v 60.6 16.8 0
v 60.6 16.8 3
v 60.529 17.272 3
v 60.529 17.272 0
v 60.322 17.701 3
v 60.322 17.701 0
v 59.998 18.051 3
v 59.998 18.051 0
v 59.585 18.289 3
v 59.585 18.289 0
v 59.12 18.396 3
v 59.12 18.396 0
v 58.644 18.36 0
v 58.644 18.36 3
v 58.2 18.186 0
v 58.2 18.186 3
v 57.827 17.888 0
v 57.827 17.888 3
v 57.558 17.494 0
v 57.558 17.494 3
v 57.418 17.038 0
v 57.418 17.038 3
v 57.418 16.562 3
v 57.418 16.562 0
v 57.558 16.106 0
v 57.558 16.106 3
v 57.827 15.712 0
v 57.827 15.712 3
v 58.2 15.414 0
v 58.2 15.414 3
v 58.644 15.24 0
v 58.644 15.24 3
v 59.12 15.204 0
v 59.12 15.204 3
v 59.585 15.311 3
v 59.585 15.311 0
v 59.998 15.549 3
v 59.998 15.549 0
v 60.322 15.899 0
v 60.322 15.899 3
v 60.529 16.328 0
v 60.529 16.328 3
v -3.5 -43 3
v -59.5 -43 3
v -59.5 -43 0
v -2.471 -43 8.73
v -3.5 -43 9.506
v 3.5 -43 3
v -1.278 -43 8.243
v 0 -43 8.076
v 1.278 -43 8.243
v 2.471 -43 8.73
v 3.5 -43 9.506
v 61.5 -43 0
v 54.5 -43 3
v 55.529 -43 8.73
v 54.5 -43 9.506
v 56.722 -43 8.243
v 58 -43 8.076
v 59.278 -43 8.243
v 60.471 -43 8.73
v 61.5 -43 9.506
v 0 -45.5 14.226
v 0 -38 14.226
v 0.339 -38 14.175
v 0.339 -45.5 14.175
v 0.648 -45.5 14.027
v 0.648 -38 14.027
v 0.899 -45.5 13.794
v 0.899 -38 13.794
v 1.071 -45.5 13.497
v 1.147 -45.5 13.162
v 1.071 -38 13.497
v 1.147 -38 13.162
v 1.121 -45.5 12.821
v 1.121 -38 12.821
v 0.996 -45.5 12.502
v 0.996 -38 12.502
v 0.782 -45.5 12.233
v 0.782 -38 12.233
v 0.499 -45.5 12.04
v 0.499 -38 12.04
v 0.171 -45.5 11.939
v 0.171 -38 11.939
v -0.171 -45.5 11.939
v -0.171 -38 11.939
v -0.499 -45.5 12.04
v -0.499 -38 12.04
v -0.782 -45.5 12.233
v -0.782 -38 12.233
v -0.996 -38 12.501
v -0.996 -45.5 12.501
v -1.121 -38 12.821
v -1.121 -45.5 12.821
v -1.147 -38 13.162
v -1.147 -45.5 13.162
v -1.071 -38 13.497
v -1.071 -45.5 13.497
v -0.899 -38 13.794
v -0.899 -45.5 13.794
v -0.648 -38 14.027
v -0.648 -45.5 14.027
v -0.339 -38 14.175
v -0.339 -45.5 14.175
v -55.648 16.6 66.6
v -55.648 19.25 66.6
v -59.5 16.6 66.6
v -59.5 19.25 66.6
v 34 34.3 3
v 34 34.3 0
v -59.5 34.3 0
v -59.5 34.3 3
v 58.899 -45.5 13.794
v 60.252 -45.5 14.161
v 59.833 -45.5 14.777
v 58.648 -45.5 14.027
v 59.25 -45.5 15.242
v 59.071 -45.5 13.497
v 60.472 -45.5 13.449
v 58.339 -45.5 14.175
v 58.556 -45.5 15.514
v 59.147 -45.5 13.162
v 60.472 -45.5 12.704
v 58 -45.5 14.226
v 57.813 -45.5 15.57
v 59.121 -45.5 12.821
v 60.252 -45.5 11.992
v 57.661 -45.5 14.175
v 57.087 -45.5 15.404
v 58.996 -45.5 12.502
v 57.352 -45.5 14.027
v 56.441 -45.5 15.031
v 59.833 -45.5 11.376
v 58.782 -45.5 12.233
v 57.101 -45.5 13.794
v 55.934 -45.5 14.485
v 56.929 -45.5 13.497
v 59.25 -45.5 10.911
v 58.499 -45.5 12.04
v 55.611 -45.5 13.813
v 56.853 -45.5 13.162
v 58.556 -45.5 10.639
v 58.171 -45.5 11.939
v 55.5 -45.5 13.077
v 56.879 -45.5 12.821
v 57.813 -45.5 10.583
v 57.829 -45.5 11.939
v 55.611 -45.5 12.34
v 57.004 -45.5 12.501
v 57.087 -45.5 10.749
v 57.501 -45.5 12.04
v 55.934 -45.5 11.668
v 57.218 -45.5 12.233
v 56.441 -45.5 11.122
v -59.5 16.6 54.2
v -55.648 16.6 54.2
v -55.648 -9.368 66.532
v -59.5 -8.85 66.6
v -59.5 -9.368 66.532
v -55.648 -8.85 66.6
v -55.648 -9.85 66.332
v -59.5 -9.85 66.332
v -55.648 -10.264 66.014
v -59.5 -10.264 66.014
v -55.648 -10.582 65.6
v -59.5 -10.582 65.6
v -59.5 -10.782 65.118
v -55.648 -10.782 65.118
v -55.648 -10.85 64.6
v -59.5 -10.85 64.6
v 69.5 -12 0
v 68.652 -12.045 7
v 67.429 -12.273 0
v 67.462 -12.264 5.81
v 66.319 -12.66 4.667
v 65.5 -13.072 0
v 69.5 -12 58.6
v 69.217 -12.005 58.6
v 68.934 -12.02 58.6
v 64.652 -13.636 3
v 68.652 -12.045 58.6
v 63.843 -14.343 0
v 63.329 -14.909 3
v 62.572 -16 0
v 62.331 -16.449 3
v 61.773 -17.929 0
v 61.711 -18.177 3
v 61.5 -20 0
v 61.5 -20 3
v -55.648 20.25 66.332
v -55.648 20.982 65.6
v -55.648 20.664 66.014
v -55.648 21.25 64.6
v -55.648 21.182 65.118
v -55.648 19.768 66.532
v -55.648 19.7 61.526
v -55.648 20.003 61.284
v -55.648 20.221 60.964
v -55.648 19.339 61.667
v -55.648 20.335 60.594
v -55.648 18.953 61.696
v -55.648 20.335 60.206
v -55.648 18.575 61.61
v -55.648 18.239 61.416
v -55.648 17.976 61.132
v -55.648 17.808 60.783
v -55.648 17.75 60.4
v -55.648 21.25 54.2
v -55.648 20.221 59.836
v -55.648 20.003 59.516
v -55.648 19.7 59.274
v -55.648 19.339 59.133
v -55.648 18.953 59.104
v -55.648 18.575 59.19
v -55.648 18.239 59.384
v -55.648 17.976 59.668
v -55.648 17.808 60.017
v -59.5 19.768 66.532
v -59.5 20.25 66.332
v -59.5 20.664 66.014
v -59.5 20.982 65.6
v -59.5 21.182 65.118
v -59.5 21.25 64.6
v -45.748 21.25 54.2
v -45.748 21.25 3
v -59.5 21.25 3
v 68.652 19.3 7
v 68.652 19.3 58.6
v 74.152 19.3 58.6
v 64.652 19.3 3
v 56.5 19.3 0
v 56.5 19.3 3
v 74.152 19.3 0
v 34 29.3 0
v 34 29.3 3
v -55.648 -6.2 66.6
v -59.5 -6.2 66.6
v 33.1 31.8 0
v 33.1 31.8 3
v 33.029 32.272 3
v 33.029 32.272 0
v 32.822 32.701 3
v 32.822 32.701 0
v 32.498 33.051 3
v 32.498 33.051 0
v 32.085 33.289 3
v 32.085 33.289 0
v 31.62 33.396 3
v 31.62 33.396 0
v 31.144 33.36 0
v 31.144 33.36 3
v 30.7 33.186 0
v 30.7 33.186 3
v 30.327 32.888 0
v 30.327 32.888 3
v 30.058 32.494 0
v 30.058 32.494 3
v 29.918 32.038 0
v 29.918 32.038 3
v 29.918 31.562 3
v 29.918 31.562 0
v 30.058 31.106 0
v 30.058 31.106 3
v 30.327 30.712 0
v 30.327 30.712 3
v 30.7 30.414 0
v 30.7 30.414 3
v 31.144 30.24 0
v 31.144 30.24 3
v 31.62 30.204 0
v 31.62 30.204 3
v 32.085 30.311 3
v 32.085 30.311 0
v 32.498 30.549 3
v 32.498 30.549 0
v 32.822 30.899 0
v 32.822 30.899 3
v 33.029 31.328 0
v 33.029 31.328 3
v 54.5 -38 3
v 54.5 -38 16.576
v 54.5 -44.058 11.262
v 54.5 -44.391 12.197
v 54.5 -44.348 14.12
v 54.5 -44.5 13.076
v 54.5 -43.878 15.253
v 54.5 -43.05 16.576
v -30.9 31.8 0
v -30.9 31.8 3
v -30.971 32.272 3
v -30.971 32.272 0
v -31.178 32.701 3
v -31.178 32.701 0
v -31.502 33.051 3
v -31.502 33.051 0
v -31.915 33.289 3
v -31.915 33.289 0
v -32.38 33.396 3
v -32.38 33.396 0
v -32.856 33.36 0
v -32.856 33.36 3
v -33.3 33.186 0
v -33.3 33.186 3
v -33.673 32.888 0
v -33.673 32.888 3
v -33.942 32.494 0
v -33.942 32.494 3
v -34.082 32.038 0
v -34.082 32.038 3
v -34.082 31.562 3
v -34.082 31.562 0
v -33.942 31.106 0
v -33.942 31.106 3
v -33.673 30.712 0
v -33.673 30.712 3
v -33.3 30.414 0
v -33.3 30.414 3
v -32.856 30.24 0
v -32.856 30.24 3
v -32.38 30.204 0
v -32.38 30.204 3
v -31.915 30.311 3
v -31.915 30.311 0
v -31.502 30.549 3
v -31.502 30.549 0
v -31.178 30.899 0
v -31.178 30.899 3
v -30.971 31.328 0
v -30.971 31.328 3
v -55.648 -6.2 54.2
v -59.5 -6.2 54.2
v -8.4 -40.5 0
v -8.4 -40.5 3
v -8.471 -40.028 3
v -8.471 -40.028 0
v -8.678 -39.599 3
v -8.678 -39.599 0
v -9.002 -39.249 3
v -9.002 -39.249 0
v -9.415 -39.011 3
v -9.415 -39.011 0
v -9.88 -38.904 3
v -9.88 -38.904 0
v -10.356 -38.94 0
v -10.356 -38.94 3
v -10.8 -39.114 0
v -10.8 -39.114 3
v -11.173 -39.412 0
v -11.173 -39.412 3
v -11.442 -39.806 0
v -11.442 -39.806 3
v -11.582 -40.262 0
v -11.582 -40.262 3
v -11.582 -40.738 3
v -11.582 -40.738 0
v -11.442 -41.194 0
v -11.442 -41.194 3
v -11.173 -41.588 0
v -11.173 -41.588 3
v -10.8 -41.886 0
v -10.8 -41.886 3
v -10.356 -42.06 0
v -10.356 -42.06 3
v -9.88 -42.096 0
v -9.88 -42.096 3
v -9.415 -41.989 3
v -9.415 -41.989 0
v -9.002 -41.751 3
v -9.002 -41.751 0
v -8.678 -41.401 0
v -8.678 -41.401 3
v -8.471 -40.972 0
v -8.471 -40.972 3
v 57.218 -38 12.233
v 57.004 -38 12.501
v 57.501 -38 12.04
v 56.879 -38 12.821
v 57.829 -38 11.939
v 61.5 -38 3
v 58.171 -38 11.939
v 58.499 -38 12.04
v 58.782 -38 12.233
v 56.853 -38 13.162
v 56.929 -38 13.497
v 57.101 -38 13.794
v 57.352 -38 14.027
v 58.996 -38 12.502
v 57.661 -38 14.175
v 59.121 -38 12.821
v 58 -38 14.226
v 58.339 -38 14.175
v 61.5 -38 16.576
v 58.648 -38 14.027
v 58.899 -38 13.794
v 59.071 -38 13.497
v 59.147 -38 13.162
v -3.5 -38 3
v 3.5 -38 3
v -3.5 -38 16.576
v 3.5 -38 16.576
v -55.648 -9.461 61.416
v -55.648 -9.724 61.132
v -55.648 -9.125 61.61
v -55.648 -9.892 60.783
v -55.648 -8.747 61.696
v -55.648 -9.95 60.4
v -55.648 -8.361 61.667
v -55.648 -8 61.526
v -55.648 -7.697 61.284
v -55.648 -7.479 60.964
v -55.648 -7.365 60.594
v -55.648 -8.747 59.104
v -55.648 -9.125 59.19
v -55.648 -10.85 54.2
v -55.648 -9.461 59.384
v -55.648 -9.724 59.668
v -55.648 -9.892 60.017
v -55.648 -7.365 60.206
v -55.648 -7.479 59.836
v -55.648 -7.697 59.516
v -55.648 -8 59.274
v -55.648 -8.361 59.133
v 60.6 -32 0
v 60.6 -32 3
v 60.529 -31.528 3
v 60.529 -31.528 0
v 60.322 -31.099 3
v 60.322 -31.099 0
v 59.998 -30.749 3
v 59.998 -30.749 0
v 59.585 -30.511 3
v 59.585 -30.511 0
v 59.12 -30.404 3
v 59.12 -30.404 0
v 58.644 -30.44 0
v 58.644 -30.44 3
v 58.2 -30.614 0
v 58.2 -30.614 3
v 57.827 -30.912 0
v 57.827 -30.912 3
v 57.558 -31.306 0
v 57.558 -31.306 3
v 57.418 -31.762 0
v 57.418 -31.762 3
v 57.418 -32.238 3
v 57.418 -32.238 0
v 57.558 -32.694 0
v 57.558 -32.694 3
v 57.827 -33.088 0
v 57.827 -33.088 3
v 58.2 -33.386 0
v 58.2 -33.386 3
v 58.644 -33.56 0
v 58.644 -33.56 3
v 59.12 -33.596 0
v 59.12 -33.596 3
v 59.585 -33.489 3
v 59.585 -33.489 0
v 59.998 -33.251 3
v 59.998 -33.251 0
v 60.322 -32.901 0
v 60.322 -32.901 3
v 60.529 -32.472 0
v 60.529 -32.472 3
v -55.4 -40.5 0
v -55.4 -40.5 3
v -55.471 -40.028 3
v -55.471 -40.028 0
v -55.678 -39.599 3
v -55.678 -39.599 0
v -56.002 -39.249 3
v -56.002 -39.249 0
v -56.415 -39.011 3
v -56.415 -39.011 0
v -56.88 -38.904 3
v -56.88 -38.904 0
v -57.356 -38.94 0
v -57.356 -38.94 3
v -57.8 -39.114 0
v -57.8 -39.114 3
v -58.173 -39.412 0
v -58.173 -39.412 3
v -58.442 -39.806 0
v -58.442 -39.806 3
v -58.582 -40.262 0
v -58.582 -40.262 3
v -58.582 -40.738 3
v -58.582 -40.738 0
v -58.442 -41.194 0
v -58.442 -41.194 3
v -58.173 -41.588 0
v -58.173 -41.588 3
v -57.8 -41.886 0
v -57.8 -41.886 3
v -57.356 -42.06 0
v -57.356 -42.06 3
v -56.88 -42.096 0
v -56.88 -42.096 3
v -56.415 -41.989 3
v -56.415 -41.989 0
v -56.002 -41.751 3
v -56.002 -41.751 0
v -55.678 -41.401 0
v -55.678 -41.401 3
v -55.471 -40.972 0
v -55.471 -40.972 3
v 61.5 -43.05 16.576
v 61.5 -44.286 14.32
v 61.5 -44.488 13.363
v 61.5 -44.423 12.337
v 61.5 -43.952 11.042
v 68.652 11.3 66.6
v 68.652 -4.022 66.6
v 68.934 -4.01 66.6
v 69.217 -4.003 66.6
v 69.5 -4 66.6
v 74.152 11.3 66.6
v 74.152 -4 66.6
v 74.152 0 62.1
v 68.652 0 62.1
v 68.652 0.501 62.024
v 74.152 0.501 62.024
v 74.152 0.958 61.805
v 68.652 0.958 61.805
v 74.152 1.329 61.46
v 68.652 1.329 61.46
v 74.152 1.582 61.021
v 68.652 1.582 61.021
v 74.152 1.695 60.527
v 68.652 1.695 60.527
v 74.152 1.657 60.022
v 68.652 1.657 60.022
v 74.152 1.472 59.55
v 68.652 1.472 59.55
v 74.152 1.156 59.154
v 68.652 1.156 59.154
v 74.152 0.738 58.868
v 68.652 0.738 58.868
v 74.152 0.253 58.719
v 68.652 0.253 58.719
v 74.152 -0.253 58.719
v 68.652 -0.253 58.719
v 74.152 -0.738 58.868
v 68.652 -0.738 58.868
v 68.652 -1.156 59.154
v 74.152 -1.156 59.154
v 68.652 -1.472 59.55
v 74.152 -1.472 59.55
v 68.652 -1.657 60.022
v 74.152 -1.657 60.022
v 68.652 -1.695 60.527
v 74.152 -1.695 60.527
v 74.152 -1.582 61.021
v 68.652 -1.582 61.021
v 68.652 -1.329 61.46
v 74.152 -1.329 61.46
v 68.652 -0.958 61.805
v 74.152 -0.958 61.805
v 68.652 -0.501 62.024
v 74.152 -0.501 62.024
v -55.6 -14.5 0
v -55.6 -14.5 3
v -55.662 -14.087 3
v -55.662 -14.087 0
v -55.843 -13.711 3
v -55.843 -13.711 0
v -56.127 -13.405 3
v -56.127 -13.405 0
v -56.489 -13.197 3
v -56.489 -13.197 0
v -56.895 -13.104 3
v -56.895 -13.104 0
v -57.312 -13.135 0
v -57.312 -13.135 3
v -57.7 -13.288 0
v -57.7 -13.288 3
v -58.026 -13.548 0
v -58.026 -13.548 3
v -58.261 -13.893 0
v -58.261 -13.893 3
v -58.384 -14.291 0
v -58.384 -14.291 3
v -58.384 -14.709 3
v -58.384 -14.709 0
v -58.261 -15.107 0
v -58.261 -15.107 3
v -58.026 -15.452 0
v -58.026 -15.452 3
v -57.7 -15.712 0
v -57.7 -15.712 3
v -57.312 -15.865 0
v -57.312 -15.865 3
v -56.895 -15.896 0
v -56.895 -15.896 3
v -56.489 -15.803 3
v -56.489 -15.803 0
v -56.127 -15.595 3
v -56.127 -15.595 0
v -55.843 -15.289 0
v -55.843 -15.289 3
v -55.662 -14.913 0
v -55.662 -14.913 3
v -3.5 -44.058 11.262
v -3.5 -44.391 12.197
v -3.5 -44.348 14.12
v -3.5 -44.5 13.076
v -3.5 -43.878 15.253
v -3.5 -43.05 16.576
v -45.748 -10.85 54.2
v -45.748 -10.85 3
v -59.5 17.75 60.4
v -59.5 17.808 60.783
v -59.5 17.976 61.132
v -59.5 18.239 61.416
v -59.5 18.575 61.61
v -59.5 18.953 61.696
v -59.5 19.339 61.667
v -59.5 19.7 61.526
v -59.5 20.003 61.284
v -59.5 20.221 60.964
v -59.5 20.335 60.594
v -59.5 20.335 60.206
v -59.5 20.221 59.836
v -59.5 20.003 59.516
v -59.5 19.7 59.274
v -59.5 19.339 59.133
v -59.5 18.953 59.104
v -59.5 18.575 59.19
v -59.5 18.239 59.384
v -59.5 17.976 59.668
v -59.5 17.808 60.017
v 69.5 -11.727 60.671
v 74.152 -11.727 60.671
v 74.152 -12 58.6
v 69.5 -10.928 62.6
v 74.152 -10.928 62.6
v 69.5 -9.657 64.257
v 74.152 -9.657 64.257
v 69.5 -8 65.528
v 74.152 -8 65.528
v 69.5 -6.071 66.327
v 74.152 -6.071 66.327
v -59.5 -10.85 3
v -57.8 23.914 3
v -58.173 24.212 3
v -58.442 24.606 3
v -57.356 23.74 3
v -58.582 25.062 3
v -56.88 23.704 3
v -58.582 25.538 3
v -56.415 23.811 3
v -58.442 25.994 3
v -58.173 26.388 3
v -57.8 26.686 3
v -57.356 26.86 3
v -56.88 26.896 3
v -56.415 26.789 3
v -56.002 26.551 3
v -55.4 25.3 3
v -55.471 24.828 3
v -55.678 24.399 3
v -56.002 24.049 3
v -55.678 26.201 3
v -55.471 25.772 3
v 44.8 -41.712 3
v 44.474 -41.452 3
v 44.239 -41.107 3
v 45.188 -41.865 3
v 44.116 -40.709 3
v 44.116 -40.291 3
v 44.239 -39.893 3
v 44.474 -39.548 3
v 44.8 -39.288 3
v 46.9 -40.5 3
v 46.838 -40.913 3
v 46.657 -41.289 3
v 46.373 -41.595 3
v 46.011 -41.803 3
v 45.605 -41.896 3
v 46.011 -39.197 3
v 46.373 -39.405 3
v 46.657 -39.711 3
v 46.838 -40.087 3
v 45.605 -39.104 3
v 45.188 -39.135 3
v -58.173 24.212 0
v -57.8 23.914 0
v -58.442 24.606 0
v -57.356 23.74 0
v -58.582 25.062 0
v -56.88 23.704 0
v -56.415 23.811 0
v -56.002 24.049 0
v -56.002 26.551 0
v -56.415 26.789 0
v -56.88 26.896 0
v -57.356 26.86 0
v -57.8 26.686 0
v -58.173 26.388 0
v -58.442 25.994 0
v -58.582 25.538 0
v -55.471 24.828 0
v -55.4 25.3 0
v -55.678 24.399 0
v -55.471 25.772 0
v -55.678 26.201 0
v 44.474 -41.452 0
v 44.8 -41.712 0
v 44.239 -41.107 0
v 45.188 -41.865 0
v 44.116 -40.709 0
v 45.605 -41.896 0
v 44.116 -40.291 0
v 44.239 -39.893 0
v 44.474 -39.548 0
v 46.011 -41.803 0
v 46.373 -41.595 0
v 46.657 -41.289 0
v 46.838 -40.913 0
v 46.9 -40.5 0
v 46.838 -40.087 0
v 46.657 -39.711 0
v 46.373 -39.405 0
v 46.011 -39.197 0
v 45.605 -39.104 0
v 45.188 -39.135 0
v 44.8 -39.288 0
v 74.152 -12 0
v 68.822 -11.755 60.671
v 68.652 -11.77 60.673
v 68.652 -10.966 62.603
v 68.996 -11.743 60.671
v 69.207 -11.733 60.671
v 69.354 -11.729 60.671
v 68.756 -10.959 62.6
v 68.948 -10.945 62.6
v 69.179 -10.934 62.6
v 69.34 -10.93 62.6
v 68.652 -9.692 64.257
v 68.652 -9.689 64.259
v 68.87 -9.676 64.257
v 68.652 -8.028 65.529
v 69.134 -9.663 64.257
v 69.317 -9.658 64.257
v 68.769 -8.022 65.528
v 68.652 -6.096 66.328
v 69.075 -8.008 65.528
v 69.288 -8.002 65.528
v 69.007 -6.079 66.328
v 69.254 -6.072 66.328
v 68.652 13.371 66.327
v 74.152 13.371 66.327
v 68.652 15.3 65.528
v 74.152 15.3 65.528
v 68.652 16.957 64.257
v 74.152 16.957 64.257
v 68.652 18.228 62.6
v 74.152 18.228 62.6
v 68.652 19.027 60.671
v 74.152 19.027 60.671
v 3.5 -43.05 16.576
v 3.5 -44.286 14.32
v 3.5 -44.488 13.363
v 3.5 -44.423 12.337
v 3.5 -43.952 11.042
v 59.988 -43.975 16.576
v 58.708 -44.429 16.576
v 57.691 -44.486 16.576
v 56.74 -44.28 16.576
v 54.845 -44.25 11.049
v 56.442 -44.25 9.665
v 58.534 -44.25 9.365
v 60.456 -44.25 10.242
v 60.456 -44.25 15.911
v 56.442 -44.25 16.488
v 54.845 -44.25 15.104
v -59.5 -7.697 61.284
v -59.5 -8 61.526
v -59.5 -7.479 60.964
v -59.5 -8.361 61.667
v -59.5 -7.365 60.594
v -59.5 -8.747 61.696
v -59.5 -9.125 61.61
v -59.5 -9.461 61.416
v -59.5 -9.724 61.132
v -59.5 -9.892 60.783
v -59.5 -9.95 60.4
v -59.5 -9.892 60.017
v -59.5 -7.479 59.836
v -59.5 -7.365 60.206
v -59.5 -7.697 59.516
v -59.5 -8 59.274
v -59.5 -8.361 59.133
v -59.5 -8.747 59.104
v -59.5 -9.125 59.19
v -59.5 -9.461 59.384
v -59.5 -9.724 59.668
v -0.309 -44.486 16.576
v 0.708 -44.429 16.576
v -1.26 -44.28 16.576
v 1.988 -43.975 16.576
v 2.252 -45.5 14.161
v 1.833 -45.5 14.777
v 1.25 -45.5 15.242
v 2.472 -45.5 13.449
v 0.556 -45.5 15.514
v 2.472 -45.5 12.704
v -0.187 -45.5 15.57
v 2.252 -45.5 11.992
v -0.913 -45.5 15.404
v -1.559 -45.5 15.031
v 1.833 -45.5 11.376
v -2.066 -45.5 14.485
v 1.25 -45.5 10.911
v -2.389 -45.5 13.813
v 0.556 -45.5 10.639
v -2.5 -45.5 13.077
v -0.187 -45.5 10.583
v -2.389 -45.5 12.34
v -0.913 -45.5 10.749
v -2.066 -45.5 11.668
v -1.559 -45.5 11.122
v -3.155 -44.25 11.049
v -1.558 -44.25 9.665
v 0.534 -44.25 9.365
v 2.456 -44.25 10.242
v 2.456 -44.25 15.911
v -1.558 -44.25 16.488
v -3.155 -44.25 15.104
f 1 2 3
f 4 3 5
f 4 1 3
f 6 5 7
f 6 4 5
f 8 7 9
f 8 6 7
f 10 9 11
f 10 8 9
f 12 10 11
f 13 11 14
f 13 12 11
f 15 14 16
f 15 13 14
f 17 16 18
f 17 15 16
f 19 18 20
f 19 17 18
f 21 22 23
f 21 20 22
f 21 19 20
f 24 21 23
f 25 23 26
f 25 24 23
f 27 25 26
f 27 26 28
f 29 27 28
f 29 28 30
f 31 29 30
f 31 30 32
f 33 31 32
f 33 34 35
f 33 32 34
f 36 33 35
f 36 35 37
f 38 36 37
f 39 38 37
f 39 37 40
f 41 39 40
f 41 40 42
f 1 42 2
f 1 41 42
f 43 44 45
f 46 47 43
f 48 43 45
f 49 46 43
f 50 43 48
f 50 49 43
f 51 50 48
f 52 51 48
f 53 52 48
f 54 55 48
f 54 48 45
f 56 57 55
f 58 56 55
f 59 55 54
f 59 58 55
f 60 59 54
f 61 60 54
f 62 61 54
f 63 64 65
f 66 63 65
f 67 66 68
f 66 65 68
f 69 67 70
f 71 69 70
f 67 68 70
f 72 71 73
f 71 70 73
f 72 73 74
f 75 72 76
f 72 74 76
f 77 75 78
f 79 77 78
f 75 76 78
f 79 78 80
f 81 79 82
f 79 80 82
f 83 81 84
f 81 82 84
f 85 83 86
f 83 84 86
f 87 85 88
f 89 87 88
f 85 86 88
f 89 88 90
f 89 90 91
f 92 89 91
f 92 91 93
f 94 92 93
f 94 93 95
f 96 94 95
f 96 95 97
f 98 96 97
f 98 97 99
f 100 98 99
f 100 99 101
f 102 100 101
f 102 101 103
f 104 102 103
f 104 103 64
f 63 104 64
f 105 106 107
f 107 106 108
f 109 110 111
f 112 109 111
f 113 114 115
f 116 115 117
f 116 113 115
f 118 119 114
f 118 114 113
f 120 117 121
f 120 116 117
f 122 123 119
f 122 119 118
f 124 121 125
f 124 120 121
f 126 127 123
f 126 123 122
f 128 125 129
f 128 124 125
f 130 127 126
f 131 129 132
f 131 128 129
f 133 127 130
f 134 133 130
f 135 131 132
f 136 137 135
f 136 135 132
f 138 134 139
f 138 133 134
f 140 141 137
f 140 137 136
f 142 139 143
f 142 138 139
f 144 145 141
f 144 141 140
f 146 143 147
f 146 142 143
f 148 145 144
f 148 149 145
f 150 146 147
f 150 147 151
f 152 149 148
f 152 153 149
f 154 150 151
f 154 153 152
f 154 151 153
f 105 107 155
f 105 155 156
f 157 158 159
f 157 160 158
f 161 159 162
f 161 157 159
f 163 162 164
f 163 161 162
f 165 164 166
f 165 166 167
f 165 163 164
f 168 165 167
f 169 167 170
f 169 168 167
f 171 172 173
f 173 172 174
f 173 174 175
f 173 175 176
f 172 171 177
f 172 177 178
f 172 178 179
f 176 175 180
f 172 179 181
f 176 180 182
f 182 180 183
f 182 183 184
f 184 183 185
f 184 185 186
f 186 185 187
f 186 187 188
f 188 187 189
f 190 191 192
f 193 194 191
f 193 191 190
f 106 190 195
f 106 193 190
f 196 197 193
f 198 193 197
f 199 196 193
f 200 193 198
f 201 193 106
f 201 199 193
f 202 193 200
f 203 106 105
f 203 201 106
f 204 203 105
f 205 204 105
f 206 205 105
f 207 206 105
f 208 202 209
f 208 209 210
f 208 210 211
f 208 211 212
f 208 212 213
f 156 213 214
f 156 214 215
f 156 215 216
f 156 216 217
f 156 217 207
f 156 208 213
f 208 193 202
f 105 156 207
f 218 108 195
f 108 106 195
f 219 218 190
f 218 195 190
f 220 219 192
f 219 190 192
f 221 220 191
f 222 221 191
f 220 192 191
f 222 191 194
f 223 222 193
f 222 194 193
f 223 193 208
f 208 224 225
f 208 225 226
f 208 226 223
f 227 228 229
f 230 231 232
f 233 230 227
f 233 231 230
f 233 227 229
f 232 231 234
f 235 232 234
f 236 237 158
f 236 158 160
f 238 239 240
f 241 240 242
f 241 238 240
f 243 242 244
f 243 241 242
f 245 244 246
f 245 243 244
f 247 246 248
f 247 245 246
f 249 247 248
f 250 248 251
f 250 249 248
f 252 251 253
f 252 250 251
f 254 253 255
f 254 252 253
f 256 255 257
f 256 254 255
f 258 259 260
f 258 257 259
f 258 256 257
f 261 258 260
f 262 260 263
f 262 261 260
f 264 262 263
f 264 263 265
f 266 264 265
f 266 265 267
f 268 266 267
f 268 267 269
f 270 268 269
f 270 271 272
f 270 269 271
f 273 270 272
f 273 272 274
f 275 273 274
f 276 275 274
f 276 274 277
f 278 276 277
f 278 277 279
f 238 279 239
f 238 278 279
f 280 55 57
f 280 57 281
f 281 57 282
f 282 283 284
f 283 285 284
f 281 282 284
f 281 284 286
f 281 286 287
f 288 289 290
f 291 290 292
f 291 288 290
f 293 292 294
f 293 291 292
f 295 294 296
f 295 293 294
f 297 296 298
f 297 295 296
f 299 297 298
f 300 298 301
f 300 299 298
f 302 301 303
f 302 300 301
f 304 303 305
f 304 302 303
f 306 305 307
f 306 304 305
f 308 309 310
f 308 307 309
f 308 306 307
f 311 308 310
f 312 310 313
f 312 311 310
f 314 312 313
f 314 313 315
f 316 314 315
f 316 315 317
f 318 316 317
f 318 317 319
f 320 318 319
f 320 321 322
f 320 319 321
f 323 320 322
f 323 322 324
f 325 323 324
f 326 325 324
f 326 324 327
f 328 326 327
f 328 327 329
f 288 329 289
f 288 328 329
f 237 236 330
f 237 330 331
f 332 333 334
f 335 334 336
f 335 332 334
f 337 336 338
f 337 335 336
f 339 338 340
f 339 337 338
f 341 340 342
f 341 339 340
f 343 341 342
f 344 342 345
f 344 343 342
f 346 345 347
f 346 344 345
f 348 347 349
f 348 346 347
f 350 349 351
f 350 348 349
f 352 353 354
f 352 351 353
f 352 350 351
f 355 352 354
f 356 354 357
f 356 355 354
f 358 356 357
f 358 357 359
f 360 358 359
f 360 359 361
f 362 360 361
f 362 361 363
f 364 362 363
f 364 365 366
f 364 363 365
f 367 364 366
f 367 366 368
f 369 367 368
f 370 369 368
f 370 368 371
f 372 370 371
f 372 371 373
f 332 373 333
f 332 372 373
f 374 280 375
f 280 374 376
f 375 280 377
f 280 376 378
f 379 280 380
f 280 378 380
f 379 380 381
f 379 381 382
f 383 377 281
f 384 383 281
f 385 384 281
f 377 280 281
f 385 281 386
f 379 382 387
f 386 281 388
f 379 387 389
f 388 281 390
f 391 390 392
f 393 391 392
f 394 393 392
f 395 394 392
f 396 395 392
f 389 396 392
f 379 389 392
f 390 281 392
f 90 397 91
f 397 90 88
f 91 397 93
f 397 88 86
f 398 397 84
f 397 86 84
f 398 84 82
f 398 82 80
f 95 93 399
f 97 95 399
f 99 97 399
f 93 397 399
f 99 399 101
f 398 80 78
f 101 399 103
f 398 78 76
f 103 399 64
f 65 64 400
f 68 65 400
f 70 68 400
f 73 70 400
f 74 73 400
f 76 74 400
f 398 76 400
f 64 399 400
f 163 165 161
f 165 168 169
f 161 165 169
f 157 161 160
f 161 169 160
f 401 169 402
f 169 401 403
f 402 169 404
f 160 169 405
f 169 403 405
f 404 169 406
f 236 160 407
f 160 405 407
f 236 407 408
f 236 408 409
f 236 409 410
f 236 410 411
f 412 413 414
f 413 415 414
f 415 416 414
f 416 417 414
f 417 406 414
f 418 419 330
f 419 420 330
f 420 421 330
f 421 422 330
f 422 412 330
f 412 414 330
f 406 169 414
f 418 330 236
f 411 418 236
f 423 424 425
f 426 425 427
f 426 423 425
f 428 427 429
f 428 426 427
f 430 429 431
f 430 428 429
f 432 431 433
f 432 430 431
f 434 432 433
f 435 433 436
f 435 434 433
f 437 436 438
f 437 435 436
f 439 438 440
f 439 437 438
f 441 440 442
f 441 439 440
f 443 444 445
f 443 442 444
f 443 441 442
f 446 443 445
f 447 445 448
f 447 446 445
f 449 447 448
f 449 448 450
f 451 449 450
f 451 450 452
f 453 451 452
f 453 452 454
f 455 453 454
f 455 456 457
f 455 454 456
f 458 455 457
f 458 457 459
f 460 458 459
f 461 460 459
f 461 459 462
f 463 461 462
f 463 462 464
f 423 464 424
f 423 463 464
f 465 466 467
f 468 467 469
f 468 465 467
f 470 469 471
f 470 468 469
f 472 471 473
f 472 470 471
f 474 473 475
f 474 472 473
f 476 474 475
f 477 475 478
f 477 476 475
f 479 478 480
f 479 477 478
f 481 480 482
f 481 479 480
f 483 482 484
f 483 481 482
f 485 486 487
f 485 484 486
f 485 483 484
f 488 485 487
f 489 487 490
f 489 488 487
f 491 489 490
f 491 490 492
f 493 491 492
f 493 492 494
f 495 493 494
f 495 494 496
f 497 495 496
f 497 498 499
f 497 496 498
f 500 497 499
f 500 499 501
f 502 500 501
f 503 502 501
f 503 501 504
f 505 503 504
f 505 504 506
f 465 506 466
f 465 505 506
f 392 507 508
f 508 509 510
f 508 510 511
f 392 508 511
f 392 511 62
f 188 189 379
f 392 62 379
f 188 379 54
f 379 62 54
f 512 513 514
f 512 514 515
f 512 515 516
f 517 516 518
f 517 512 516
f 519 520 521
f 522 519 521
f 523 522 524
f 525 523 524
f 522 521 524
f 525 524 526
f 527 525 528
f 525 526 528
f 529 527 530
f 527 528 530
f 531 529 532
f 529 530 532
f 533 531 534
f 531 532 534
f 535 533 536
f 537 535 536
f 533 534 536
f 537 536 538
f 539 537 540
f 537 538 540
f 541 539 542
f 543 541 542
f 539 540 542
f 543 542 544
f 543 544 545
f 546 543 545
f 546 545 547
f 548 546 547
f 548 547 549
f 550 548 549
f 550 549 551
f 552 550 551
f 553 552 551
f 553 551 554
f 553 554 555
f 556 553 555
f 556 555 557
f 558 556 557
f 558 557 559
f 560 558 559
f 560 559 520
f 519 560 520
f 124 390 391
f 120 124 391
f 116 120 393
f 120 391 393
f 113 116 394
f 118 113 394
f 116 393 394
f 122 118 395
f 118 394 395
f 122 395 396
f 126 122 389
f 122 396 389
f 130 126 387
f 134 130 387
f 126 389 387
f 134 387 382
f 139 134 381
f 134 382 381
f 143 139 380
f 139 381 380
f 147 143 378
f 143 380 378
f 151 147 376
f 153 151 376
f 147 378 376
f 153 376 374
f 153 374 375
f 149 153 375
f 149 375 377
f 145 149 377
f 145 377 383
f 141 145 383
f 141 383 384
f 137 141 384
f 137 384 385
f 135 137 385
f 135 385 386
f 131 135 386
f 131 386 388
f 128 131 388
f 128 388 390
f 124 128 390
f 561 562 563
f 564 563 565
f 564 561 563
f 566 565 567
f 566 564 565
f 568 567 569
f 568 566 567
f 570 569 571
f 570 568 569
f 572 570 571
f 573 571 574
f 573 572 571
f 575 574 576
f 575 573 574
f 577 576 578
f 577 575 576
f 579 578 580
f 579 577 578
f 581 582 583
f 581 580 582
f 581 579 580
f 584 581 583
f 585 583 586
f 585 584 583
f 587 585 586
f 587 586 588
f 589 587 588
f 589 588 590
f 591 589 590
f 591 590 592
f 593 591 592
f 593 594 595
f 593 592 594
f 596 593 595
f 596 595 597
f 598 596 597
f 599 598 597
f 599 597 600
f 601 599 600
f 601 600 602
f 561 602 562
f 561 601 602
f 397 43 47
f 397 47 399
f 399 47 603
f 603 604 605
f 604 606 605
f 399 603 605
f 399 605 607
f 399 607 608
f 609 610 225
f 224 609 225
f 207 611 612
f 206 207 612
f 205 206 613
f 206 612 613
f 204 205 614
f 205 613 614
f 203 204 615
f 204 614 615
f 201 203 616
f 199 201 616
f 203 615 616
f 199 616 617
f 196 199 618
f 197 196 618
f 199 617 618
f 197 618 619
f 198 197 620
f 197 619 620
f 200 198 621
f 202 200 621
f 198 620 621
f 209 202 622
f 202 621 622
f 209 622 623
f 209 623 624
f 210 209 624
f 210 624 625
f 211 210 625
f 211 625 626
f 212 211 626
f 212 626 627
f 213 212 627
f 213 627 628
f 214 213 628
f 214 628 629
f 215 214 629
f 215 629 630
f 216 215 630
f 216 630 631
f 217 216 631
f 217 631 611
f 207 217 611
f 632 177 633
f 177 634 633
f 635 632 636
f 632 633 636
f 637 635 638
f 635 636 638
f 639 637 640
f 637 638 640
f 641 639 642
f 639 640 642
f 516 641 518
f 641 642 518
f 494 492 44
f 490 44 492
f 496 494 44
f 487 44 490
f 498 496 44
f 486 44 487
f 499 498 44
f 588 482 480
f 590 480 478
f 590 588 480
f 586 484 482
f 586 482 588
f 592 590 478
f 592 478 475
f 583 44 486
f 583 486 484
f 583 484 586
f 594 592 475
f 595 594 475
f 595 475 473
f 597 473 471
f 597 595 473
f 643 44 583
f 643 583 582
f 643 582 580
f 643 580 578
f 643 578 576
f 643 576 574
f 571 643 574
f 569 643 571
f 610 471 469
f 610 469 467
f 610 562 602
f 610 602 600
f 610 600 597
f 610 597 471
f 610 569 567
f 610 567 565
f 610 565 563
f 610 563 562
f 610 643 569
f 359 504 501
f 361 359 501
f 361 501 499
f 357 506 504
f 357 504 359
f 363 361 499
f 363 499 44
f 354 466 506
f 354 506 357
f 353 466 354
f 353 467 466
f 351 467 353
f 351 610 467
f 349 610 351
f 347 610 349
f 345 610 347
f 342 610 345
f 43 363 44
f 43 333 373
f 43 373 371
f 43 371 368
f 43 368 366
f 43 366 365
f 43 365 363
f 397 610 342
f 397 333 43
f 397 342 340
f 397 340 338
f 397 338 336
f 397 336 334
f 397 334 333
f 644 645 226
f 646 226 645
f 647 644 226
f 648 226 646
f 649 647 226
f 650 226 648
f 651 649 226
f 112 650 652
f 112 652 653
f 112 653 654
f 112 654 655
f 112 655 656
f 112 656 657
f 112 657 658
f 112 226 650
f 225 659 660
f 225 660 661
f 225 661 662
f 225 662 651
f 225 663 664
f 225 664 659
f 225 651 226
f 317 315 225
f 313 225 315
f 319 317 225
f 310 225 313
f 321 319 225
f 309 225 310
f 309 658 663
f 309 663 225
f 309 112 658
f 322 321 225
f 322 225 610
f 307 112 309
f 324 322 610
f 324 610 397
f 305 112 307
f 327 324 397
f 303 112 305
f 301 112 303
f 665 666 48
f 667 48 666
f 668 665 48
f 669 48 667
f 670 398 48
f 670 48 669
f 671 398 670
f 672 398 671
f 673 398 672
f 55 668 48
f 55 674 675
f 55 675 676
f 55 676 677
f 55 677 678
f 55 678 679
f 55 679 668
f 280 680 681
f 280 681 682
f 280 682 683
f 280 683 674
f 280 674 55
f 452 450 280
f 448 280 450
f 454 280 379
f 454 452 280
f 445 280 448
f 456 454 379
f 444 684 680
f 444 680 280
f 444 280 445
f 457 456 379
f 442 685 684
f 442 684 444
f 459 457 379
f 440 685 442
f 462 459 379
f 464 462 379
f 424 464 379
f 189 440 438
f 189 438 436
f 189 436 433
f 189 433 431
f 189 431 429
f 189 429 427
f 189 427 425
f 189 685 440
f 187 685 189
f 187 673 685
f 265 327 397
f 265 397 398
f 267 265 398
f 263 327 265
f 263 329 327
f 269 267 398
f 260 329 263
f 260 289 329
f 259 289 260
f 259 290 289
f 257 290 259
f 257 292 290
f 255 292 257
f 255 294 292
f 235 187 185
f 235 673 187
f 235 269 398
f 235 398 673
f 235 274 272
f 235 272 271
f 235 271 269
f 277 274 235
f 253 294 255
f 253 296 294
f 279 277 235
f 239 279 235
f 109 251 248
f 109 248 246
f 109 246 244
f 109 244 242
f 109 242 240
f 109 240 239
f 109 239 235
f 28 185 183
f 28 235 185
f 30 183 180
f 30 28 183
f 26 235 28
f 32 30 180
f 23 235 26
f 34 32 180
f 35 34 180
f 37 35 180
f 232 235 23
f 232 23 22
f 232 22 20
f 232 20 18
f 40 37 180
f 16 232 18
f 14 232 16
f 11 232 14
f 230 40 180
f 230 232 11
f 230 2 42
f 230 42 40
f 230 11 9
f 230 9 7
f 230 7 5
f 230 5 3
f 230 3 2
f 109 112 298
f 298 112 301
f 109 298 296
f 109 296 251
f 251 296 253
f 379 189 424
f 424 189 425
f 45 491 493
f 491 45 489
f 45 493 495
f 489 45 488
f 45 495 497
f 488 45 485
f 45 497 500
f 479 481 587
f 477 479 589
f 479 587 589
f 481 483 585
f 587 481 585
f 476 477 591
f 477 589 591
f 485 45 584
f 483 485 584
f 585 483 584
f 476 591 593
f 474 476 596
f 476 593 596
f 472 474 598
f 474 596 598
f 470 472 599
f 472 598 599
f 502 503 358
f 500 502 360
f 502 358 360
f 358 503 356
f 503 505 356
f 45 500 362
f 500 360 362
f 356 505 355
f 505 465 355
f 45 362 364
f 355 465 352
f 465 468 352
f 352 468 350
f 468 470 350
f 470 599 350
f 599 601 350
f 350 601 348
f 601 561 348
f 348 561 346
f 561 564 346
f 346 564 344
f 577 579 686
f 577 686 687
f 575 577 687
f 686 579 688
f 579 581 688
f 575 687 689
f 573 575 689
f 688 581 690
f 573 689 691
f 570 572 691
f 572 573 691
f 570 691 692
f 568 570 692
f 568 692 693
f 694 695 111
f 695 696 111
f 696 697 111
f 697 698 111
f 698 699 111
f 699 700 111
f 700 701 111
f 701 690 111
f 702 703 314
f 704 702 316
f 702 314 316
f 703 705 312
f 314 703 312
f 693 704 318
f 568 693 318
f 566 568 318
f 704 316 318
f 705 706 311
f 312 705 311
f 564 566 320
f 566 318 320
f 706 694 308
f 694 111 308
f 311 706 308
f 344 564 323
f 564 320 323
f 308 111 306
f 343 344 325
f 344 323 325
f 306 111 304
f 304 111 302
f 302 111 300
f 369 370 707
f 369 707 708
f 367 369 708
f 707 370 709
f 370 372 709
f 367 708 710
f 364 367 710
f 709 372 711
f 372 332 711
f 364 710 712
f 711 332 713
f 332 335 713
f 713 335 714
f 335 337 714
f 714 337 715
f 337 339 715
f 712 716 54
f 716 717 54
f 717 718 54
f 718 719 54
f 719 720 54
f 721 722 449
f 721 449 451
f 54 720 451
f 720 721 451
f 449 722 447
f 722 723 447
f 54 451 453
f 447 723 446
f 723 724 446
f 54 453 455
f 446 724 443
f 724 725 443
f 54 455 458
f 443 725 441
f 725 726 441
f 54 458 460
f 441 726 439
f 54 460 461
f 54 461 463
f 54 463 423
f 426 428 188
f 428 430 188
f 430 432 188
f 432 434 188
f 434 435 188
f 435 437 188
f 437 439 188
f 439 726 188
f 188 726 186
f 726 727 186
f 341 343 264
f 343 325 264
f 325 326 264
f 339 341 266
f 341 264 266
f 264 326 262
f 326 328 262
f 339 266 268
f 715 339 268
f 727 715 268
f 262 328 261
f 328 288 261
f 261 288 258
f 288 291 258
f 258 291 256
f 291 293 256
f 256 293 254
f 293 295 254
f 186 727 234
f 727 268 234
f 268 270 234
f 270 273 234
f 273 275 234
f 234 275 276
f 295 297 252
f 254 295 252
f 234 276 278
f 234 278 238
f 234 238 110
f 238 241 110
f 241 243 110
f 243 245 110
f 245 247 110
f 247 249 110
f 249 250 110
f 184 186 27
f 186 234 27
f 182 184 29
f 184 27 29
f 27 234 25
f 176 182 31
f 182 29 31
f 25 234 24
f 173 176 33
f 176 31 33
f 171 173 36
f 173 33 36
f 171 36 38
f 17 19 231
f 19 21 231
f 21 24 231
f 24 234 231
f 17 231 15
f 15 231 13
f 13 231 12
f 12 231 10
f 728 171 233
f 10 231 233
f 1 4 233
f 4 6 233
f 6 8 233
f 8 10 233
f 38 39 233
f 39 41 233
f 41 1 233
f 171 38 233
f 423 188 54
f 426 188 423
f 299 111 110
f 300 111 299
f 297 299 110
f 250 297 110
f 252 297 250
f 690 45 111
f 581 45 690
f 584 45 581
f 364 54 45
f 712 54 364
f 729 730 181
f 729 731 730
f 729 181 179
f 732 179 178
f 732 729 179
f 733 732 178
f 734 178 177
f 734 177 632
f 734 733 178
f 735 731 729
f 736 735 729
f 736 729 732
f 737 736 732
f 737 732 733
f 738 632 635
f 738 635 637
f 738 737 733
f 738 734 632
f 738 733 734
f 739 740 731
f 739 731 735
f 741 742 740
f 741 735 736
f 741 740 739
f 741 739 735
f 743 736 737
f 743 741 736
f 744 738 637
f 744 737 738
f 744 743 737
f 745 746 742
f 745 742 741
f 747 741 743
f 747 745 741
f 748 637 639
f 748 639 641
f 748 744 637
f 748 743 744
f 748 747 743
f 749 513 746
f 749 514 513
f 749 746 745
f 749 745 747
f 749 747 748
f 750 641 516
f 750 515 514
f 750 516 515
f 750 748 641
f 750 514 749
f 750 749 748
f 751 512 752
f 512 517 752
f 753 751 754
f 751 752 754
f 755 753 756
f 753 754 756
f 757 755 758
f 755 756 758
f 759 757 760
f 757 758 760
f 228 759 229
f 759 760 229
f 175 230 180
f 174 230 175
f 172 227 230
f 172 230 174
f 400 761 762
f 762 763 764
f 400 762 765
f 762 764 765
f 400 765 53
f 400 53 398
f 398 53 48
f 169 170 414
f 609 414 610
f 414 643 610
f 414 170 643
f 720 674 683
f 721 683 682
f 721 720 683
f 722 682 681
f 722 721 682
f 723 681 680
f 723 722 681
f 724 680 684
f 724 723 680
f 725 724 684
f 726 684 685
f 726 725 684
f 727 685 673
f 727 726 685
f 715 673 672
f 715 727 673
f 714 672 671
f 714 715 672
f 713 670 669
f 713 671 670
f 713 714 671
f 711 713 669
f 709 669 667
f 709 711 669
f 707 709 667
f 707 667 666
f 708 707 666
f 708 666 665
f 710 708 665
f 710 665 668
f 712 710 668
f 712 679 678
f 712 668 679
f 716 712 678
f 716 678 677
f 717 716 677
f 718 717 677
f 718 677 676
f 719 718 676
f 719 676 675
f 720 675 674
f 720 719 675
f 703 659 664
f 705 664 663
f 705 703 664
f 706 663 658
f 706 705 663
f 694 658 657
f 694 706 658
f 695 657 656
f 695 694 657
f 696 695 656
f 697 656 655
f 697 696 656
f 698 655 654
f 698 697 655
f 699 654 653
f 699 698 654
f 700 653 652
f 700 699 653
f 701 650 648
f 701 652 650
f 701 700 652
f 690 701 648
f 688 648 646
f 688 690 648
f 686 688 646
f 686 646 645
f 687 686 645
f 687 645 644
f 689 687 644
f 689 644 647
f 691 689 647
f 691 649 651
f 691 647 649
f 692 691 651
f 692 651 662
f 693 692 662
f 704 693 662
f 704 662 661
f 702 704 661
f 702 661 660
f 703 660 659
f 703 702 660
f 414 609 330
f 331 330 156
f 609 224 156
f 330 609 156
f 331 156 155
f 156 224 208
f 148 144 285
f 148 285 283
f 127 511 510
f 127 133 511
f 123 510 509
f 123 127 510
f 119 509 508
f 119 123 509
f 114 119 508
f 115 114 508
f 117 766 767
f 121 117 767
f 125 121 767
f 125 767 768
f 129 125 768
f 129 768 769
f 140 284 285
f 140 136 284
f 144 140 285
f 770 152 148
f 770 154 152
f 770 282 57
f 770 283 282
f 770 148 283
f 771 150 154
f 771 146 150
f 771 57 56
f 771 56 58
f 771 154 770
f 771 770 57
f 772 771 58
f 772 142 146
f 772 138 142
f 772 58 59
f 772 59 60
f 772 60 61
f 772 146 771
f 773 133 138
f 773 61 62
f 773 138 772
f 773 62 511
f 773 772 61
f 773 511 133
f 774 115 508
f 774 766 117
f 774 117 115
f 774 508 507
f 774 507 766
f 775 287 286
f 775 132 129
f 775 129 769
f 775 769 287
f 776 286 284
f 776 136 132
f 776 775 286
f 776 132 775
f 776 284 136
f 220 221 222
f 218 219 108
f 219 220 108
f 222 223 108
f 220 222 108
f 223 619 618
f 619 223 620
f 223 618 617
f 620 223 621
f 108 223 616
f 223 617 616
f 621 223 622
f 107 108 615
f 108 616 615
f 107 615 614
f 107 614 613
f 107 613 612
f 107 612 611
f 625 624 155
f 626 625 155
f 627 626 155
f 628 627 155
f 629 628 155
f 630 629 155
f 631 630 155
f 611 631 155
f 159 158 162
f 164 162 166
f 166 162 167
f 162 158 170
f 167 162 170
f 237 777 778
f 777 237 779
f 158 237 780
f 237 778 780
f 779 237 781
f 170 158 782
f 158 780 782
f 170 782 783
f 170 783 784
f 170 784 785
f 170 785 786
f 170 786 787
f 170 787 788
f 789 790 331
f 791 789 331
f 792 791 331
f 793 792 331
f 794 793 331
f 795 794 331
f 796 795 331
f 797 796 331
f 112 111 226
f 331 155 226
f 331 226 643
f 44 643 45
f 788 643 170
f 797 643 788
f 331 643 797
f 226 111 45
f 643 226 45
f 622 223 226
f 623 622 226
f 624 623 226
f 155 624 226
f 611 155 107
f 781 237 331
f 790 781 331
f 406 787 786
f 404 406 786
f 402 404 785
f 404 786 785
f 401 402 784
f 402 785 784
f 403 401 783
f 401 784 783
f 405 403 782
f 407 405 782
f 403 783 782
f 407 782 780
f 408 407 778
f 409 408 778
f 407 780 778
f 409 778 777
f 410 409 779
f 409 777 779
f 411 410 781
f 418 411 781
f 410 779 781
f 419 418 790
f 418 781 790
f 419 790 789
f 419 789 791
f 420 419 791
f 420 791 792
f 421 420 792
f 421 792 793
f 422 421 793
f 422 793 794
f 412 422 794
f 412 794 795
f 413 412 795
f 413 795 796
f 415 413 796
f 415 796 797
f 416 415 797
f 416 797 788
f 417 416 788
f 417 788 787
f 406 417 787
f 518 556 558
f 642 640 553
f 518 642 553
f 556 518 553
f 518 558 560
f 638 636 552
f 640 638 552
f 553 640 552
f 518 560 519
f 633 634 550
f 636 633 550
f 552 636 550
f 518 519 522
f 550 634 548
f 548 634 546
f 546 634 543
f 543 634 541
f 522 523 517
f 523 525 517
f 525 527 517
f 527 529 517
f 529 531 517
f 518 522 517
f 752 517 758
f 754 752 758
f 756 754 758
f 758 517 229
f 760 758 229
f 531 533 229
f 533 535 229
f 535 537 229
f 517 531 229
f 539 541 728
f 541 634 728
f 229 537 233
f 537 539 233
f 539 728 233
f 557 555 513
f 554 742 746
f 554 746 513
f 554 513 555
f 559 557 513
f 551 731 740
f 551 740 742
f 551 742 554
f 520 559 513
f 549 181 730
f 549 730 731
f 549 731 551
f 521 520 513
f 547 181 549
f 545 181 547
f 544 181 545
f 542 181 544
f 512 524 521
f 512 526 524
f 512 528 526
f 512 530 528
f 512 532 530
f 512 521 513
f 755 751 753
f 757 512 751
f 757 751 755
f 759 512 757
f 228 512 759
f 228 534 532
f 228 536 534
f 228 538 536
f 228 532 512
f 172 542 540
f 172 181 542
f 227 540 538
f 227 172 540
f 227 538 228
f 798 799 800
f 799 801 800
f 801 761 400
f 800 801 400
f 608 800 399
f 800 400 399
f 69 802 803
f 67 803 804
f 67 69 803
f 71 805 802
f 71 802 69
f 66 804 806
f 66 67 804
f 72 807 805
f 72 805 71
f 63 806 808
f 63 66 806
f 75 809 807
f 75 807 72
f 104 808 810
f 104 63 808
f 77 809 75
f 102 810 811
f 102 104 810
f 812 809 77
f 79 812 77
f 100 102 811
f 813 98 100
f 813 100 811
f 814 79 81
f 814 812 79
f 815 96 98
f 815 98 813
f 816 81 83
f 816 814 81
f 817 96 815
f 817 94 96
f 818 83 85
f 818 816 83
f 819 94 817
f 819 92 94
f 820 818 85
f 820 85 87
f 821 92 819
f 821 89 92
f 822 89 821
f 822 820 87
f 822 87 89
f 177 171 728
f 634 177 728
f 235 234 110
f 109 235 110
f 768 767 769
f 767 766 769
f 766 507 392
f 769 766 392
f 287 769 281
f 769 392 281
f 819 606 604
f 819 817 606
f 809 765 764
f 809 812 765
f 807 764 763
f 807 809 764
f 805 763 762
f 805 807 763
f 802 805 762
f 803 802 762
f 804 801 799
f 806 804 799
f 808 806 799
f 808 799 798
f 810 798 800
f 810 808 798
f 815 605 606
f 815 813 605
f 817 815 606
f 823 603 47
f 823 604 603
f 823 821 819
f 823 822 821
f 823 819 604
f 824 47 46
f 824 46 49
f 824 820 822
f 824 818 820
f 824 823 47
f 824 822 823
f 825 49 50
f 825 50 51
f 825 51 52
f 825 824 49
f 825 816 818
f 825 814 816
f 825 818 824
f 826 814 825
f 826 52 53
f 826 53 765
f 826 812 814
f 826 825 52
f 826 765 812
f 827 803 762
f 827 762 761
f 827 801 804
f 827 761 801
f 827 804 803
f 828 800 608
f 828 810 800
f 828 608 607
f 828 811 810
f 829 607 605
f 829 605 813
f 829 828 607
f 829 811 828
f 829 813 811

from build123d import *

# Parameters (mm, degrees)
BASE_DEPTH          = 3
SERVO_SUPPORT_DEPTH = 54.2
SERVO_MOUNTS_DEPTH  = 12.4
SERVO_SCREWS_REACH  = 146.657
SKETCH22_R          = 1.3
FILLET1_R           = 2
SKETCH23_W          = 12.651847812
SKETCH23_H          = 31.3
SHAFT_SUPPORT_DEPTH = 3
SKETCH24_W          = 5.5
SKETCH24_H          = 31.3
BOSS_EXTRUDE6_DEPTH = 66.6
FILLET2_R           = 8
FILLET3_R           = 8
SHAFT_REACH         = 152.69
SKETCH25_R          = 1.7
SCREWS_REACH        = 110.55
SKETCH26_R          = 1.6
SKETCH26_R_2        = 1.4
SKETCH31_W          = 7
SKETCH31_H          = 13.5765
BOSS_EXTRUDE8_DEPTH = 5
SKETCH30_R          = 2.5
BOSS_EXTRUDE9_DEPTH = 2.5
CUT_EXTRUDE1_REACH  = 125.131
SKETCH32_R          = 1.15
CHAMFER1_SIZE       = 2.5
CHAMFER2_SIZE       = 4


with BuildPart() as part:
    # Sketch19 → Base (new body)
    with BuildSketch(Plane.XY):
        Polygon((61.5, 19.3), (56.5, 19.3), (34, 29.3), (34, 34.3), (-59.5, 34.3), (-59.5, -43), (61.5, -43), align=None)
    extrude(amount=BASE_DEPTH)

    # Sketch20 → Servo support (add)
    with BuildSketch(Plane.XY):
        Polygon((-53.298152188, -10.85), (-55.448152188, -10.85), (-59.5, -10.85), (-59.5, 21.25), (-55.448152188, 21.25), (-53.298152188, 21.25), (-45.748152188, 21.25), (-45.748152188, 8.609473612), (-45.748152188, -10.85), align=None)
    extrude(amount=SERVO_SUPPORT_DEPTH)

    # Sketch21 → Servo mounts (add)
    with BuildSketch(Plane.XY.offset(54.2)):
        Polygon((-55.848152188, -6.2), (-59.5, -6.2), (-59.5, -10.85), (-55.648152188, -10.85), (-55.648152188, -6.2), align=None)
        Polygon((-55.848152188, 16.6), (-59.5, 16.6), (-59.5, 21.25), (-55.648152188, 21.25), (-55.648152188, 16.6), align=None)
    extrude(amount=SERVO_MOUNTS_DEPTH)

    # Sketch22 → Servo screws (cut, up to next)
    with BuildSketch(Plane.ZY.offset(59.5), mode=Mode.PRIVATE) as servo_screws_sk1:
        with Locations(Location((60.4, -8.65, 0), (0, 0, 270))):
            Circle(SKETCH22_R)
    servo_screws_tool1 = extrude(servo_screws_sk1.sketch, amount=-SERVO_SCREWS_REACH, mode=Mode.PRIVATE) & part.part
    # Sketch22 → Servo screws (cut, up to next)
    with BuildSketch(Plane.ZY.offset(59.5), mode=Mode.PRIVATE) as servo_screws_sk2:
        with Locations(Location((60.4, 19.05, 0), (0, 0, 270))):
            Circle(SKETCH22_R)
    servo_screws_tool2 = extrude(servo_screws_sk2.sketch, amount=-SERVO_SCREWS_REACH, mode=Mode.PRIVATE) & part.part
    add(servo_screws_tool1.solids().sort_by_distance((-59.5, -8.65, 60.4))[0], mode=Mode.SUBTRACT)
    add(servo_screws_tool2.solids().sort_by_distance((-59.5, 19.05, 60.4))[0], mode=Mode.SUBTRACT)

    # Fillet1
    fillet1_edges = [part.edges().sort_by_distance(p)[0] for p in [
        (-57.574076094, 21.25, 66.6),
        (-57.574076094, -10.85, 66.6),
    ]]
    fillet(fillet1_edges, radius=FILLET1_R)

    # Sketch23 → Shaft support (add)
    with BuildSketch(Plane.XY):
        with Locations((67.825923906, 3.65)):
            Rectangle(SKETCH23_W, SKETCH23_H)
    extrude(amount=SHAFT_SUPPORT_DEPTH)

    # Sketch24 → Boss-Extrude6 (add)
    with BuildSketch(Plane.XY):
        with Locations((71.401847812, 3.65)):
            Rectangle(SKETCH24_W, SKETCH24_H)
    extrude(amount=BOSS_EXTRUDE6_DEPTH)

    # Fillet2
    fillet2_edges = [part.edges().sort_by_distance(p)[0] for p in [
        (61.5, -12, 1.5),
    ]]
    fillet(fillet2_edges, radius=FILLET2_R)

    # Fillet3
    fillet3_edges = [part.edges().sort_by_distance(p)[0] for p in [
        (71.401847812, 19.3, 66.6),
        (71.825923906, -12, 66.6),
        (69.075325128, -12.011279749, 66.6),
    ]]
    fillet(fillet3_edges, radius=FILLET3_R)

    # Sketch25 → Shaft (cut, up to next)
    with BuildSketch(Plane.ZY.offset(-68.651847812), mode=Mode.PRIVATE) as shaft_sk1:
        with Locations((60.4, 0)):
            Circle(SKETCH25_R)
    shaft_tool1 = extrude(shaft_sk1.sketch, amount=-SHAFT_REACH, mode=Mode.PRIVATE) & part.part
    add(shaft_tool1.solids().sort_by_distance((68.651848, 0, 60.4))[0], mode=Mode.SUBTRACT)

    # Sketch26 → Screws (cut, up to next)
    with BuildSketch(Plane.XY, mode=Mode.PRIVATE) as screws_sk1:
        with Locations((-57, -40.5)):
            Circle(SKETCH26_R)
    screws_tool1 = extrude(screws_sk1.sketch, amount=SCREWS_REACH, mode=Mode.PRIVATE) & part.part
    # Sketch26 → Screws (cut, up to next)
    with BuildSketch(Plane.XY, mode=Mode.PRIVATE) as screws_sk2:
        with Locations((-10, -40.5)):
            Circle(SKETCH26_R)
    screws_tool2 = extrude(screws_sk2.sketch, amount=SCREWS_REACH, mode=Mode.PRIVATE) & part.part
    # Sketch26 → Screws (cut, up to next)
    with BuildSketch(Plane.XY, mode=Mode.PRIVATE) as screws_sk3:
        with Locations((59, -32)):
            Circle(SKETCH26_R)
    screws_tool3 = extrude(screws_sk3.sketch, amount=SCREWS_REACH, mode=Mode.PRIVATE) & part.part
    # Sketch26 → Screws (cut, up to next)
    with BuildSketch(Plane.XY, mode=Mode.PRIVATE) as screws_sk4:
        with Locations((59, 16.8)):
            Circle(SKETCH26_R)
    screws_tool4 = extrude(screws_sk4.sketch, amount=SCREWS_REACH, mode=Mode.PRIVATE) & part.part
    # Sketch26 → Screws (cut, up to next)
    with BuildSketch(Plane.XY, mode=Mode.PRIVATE) as screws_sk5:
        with Locations((31.5, 31.8)):
            Circle(SKETCH26_R)
    screws_tool5 = extrude(screws_sk5.sketch, amount=SCREWS_REACH, mode=Mode.PRIVATE) & part.part
    # Sketch26 → Screws (cut, up to next)
    with BuildSketch(Plane.XY, mode=Mode.PRIVATE) as screws_sk6:
        with Locations((-32.5, 31.8)):
            Circle(SKETCH26_R)
    screws_tool6 = extrude(screws_sk6.sketch, amount=SCREWS_REACH, mode=Mode.PRIVATE) & part.part
    # Sketch26 → Screws (cut, up to next)
    with BuildSketch(Plane.XY, mode=Mode.PRIVATE) as screws_sk7:
        with Locations((-57, 25.3)):
            Circle(SKETCH26_R)
    screws_tool7 = extrude(screws_sk7.sketch, amount=SCREWS_REACH, mode=Mode.PRIVATE) & part.part
    # Sketch26 → Screws (cut, up to next)
    with BuildSketch(Plane.XY, mode=Mode.PRIVATE) as screws_sk8:
        with Locations((-57, -14.5)):
            Circle(SKETCH26_R_2)
    screws_tool8 = extrude(screws_sk8.sketch, amount=SCREWS_REACH, mode=Mode.PRIVATE) & part.part
    # Sketch26 → Screws (cut, up to next)
    with BuildSketch(Plane.XY, mode=Mode.PRIVATE) as screws_sk9:
        with Locations((45.5, -40.5)):
            Circle(SKETCH26_R_2)
    screws_tool9 = extrude(screws_sk9.sketch, amount=SCREWS_REACH, mode=Mode.PRIVATE) & part.part
    add(screws_tool1.solids().sort_by_distance((-57, -40.5, 0))[0], mode=Mode.SUBTRACT)
    add(screws_tool2.solids().sort_by_distance((-10, -40.5, 0))[0], mode=Mode.SUBTRACT)
    add(screws_tool3.solids().sort_by_distance((59, -32, 0))[0], mode=Mode.SUBTRACT)
    add(screws_tool4.solids().sort_by_distance((59, 16.8, 0))[0], mode=Mode.SUBTRACT)
    add(screws_tool5.solids().sort_by_distance((31.5, 31.8, 0))[0], mode=Mode.SUBTRACT)
    add(screws_tool6.solids().sort_by_distance((-32.5, 31.8, 0))[0], mode=Mode.SUBTRACT)
    add(screws_tool7.solids().sort_by_distance((-57, 25.3, 0))[0], mode=Mode.SUBTRACT)
    add(screws_tool8.solids().sort_by_distance((-57, -14.5, 0))[0], mode=Mode.SUBTRACT)
    add(screws_tool9.solids().sort_by_distance((45.5, -40.5, 0))[0], mode=Mode.SUBTRACT)

    # Sketch31 → Boss-Extrude8 (add)
    with BuildSketch(Plane.XZ.offset(43)):
        with Locations((0, 9.78825)):
            Rectangle(SKETCH31_W, SKETCH31_H)
        with Locations((58, 9.78825)):
            Rectangle(SKETCH31_W, SKETCH31_H)
    extrude(amount=-BOSS_EXTRUDE8_DEPTH)

    # Sketch30 → Boss-Extrude9 (add)
    with BuildSketch(Plane.XZ.offset(43)):
        with Locations(Location((0, 13.0765, 0), (0, 0, 180))):
            Circle(SKETCH30_R)
        with Locations(Location((58, 13.0765, 0), (0, 0, 180))):
            Circle(SKETCH30_R)
    extrude(amount=BOSS_EXTRUDE9_DEPTH)

    # Sketch32 → Cut-Extrude1 (cut, up to next)
    with BuildSketch(Plane(origin=(0, -38, 0), x_dir=(1, 0, 0), z_dir=(0, 1, 0)), mode=Mode.PRIVATE) as cut_extrude1_sk1:
        with Locations(Location((0, -13.0765, 0), (0, 0, 270))):
            Circle(SKETCH32_R)
    cut_extrude1_tool1 = extrude(cut_extrude1_sk1.sketch, amount=-CUT_EXTRUDE1_REACH, mode=Mode.PRIVATE) & part.part
    # Sketch32 → Cut-Extrude1 (cut, up to next)
    with BuildSketch(Plane(origin=(0, -38, 0), x_dir=(1, 0, 0), z_dir=(0, 1, 0)), mode=Mode.PRIVATE) as cut_extrude1_sk2:
        with Locations(Location((58, -13.0765, 0), (0, 0, 270))):
            Circle(SKETCH32_R)
    cut_extrude1_tool2 = extrude(cut_extrude1_sk2.sketch, amount=-CUT_EXTRUDE1_REACH, mode=Mode.PRIVATE) & part.part
    add(cut_extrude1_tool1.solids().sort_by_distance((0, -38, 13.0765))[0], mode=Mode.SUBTRACT)
    add(cut_extrude1_tool2.solids().sort_by_distance((58, -38, 13.0765))[0], mode=Mode.SUBTRACT)

    # Chamfer1
    # the kernel refuses this chamfer: 2.5 mm, written as the material it adds along each edge
    with BuildSketch(Plane(origin=(58, -43, 13.0765), x_dir=(-1, 0, 0), z_dir=(0, 0, 1))) as chamfer1_piece_1_section:
        Polygon((2.5 + CHAMFER1_SIZE, 0), (2.5, CHAMFER1_SIZE), (2.5, 0), align=None)
    chamfer1_piece_1 = revolve(axis=Axis((58, -43, 13.0765), (0, -1, 0)), mode=Mode.PRIVATE)
    chamfer1_piece_1 = split(chamfer1_piece_1, bisect_by=Plane(origin=(61.5, -43.330528144, 9.079752975), z_dir=(-1, 0, 0)), keep=Keep.TOP, mode=Mode.PRIVATE)
    chamfer1_piece_1 = split(chamfer1_piece_1, bisect_by=Plane(origin=(54.5, -43.330528144, 9.079752975), z_dir=(1, 0, 0)), keep=Keep.TOP, mode=Mode.PRIVATE)
    chamfer1_piece_1 = split(chamfer1_piece_1, bisect_by=Plane(origin=(55.692477029, -43.330528144, 16.5765), z_dir=(0, 0, -1)), keep=Keep.TOP, mode=Mode.PRIVATE)
    chamfer1_piece_1 = split(chamfer1_piece_1, bisect_by=Plane(origin=(55.692477029, -45.5, 9.079752975), z_dir=(0, 1, 0)), keep=Keep.TOP, mode=Mode.PRIVATE)
    add(chamfer1_piece_1)
    with BuildSketch(Plane(origin=(0, -43, 13.0765), x_dir=(-1, 0, 0), z_dir=(0, 0, 1))) as chamfer1_piece_2_section:
        Polygon((2.5 + CHAMFER1_SIZE, 0), (2.5, CHAMFER1_SIZE), (2.5, 0), align=None)
    chamfer1_piece_2 = revolve(axis=Axis((0, -43, 13.0765), (0, -1, 0)), mode=Mode.PRIVATE)
    chamfer1_piece_2 = split(chamfer1_piece_2, bisect_by=Plane(origin=(-3.5, -43.330528144, 9.079752976), z_dir=(1, 0, 0)), keep=Keep.TOP, mode=Mode.PRIVATE)
    chamfer1_piece_2 = split(chamfer1_piece_2, bisect_by=Plane(origin=(-2.30752297, -43.330528144, 16.5765), z_dir=(0, 0, -1)), keep=Keep.TOP, mode=Mode.PRIVATE)
    chamfer1_piece_2 = split(chamfer1_piece_2, bisect_by=Plane(origin=(3.5, -43.330528144, 9.079752976), z_dir=(-1, 0, 0)), keep=Keep.TOP, mode=Mode.PRIVATE)
    chamfer1_piece_2 = split(chamfer1_piece_2, bisect_by=Plane(origin=(-2.30752297, -45.5, 9.079752976), z_dir=(0, 1, 0)), keep=Keep.TOP, mode=Mode.PRIVATE)
    add(chamfer1_piece_2)

    # Chamfer2
    chamfer2_edges = [part.edges().sort_by_distance(p)[0] for p in [
        (68.651847812, 3.627456407, 3),
    ]]
    chamfer(chamfer2_edges, length=CHAMFER2_SIZE)


solid = part.part
